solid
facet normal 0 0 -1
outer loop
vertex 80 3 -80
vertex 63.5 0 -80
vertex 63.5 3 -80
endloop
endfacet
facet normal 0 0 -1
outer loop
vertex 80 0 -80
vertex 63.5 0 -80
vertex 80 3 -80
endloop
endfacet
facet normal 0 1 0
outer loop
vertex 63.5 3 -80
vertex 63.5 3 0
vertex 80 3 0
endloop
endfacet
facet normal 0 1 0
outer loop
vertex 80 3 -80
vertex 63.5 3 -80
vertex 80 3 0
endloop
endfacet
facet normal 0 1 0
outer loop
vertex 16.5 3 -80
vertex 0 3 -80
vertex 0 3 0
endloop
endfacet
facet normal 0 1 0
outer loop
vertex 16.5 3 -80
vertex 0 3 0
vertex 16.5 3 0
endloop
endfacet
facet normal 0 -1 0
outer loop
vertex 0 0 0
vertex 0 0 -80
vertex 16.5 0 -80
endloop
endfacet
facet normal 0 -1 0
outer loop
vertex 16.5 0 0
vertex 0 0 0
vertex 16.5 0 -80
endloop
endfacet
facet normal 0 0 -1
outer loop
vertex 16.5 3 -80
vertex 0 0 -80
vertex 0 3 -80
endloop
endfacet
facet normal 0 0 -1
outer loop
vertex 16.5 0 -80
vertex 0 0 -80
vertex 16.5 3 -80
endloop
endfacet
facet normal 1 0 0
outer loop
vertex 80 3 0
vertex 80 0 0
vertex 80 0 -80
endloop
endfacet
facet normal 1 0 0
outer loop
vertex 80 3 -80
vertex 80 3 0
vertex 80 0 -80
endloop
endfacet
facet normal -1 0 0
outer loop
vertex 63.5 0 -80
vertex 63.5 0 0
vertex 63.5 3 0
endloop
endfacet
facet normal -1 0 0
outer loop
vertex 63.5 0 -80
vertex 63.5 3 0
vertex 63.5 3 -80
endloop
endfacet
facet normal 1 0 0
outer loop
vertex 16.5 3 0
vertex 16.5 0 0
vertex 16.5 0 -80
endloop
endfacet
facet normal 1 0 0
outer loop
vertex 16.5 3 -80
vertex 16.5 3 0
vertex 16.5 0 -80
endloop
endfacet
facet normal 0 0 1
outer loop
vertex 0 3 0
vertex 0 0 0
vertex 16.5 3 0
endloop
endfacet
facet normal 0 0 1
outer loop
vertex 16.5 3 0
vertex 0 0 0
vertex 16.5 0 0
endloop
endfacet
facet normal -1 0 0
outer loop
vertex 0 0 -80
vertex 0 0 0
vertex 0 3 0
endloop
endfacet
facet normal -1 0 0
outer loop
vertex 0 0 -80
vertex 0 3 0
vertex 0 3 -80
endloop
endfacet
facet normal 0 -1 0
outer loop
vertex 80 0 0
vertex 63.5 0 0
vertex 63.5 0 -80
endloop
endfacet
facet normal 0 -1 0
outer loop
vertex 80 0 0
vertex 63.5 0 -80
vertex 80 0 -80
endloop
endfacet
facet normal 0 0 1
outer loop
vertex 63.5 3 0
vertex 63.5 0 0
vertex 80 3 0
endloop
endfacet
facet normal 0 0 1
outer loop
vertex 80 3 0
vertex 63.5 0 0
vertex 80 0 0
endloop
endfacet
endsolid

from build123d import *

# Parameters (mm, degrees)
SKETCH1_W             = 16.5
SKETCH1_H             = 80
BOSS_EXTRUDE1_DEPTH   = 3
BOSS_EXTRUDE1_2_DEPTH = 3


with BuildPart() as part:
    # Sketch1 → Boss-Extrude1 (new body)
    with BuildSketch(Plane(origin=(0, 0, 0), x_dir=(1, 0, 0), z_dir=(0, 1, 0))):
        with Locations((8.25, 40)):
            Rectangle(SKETCH1_W, SKETCH1_H)
    extrude(amount=BOSS_EXTRUDE1_DEPTH)


with BuildPart() as body_2:
    # Sketch1 → Boss-Extrude1 2 (new body)
    with BuildSketch(Plane(origin=(0, 0, 0), x_dir=(1, 0, 0), z_dir=(0, 1, 0))):
        with Locations((71.75, 40)):
            Rectangle(SKETCH1_W, SKETCH1_H)
    extrude(amount=BOSS_EXTRUDE1_2_DEPTH)


solid = Compound([part.part, body_2.part])
